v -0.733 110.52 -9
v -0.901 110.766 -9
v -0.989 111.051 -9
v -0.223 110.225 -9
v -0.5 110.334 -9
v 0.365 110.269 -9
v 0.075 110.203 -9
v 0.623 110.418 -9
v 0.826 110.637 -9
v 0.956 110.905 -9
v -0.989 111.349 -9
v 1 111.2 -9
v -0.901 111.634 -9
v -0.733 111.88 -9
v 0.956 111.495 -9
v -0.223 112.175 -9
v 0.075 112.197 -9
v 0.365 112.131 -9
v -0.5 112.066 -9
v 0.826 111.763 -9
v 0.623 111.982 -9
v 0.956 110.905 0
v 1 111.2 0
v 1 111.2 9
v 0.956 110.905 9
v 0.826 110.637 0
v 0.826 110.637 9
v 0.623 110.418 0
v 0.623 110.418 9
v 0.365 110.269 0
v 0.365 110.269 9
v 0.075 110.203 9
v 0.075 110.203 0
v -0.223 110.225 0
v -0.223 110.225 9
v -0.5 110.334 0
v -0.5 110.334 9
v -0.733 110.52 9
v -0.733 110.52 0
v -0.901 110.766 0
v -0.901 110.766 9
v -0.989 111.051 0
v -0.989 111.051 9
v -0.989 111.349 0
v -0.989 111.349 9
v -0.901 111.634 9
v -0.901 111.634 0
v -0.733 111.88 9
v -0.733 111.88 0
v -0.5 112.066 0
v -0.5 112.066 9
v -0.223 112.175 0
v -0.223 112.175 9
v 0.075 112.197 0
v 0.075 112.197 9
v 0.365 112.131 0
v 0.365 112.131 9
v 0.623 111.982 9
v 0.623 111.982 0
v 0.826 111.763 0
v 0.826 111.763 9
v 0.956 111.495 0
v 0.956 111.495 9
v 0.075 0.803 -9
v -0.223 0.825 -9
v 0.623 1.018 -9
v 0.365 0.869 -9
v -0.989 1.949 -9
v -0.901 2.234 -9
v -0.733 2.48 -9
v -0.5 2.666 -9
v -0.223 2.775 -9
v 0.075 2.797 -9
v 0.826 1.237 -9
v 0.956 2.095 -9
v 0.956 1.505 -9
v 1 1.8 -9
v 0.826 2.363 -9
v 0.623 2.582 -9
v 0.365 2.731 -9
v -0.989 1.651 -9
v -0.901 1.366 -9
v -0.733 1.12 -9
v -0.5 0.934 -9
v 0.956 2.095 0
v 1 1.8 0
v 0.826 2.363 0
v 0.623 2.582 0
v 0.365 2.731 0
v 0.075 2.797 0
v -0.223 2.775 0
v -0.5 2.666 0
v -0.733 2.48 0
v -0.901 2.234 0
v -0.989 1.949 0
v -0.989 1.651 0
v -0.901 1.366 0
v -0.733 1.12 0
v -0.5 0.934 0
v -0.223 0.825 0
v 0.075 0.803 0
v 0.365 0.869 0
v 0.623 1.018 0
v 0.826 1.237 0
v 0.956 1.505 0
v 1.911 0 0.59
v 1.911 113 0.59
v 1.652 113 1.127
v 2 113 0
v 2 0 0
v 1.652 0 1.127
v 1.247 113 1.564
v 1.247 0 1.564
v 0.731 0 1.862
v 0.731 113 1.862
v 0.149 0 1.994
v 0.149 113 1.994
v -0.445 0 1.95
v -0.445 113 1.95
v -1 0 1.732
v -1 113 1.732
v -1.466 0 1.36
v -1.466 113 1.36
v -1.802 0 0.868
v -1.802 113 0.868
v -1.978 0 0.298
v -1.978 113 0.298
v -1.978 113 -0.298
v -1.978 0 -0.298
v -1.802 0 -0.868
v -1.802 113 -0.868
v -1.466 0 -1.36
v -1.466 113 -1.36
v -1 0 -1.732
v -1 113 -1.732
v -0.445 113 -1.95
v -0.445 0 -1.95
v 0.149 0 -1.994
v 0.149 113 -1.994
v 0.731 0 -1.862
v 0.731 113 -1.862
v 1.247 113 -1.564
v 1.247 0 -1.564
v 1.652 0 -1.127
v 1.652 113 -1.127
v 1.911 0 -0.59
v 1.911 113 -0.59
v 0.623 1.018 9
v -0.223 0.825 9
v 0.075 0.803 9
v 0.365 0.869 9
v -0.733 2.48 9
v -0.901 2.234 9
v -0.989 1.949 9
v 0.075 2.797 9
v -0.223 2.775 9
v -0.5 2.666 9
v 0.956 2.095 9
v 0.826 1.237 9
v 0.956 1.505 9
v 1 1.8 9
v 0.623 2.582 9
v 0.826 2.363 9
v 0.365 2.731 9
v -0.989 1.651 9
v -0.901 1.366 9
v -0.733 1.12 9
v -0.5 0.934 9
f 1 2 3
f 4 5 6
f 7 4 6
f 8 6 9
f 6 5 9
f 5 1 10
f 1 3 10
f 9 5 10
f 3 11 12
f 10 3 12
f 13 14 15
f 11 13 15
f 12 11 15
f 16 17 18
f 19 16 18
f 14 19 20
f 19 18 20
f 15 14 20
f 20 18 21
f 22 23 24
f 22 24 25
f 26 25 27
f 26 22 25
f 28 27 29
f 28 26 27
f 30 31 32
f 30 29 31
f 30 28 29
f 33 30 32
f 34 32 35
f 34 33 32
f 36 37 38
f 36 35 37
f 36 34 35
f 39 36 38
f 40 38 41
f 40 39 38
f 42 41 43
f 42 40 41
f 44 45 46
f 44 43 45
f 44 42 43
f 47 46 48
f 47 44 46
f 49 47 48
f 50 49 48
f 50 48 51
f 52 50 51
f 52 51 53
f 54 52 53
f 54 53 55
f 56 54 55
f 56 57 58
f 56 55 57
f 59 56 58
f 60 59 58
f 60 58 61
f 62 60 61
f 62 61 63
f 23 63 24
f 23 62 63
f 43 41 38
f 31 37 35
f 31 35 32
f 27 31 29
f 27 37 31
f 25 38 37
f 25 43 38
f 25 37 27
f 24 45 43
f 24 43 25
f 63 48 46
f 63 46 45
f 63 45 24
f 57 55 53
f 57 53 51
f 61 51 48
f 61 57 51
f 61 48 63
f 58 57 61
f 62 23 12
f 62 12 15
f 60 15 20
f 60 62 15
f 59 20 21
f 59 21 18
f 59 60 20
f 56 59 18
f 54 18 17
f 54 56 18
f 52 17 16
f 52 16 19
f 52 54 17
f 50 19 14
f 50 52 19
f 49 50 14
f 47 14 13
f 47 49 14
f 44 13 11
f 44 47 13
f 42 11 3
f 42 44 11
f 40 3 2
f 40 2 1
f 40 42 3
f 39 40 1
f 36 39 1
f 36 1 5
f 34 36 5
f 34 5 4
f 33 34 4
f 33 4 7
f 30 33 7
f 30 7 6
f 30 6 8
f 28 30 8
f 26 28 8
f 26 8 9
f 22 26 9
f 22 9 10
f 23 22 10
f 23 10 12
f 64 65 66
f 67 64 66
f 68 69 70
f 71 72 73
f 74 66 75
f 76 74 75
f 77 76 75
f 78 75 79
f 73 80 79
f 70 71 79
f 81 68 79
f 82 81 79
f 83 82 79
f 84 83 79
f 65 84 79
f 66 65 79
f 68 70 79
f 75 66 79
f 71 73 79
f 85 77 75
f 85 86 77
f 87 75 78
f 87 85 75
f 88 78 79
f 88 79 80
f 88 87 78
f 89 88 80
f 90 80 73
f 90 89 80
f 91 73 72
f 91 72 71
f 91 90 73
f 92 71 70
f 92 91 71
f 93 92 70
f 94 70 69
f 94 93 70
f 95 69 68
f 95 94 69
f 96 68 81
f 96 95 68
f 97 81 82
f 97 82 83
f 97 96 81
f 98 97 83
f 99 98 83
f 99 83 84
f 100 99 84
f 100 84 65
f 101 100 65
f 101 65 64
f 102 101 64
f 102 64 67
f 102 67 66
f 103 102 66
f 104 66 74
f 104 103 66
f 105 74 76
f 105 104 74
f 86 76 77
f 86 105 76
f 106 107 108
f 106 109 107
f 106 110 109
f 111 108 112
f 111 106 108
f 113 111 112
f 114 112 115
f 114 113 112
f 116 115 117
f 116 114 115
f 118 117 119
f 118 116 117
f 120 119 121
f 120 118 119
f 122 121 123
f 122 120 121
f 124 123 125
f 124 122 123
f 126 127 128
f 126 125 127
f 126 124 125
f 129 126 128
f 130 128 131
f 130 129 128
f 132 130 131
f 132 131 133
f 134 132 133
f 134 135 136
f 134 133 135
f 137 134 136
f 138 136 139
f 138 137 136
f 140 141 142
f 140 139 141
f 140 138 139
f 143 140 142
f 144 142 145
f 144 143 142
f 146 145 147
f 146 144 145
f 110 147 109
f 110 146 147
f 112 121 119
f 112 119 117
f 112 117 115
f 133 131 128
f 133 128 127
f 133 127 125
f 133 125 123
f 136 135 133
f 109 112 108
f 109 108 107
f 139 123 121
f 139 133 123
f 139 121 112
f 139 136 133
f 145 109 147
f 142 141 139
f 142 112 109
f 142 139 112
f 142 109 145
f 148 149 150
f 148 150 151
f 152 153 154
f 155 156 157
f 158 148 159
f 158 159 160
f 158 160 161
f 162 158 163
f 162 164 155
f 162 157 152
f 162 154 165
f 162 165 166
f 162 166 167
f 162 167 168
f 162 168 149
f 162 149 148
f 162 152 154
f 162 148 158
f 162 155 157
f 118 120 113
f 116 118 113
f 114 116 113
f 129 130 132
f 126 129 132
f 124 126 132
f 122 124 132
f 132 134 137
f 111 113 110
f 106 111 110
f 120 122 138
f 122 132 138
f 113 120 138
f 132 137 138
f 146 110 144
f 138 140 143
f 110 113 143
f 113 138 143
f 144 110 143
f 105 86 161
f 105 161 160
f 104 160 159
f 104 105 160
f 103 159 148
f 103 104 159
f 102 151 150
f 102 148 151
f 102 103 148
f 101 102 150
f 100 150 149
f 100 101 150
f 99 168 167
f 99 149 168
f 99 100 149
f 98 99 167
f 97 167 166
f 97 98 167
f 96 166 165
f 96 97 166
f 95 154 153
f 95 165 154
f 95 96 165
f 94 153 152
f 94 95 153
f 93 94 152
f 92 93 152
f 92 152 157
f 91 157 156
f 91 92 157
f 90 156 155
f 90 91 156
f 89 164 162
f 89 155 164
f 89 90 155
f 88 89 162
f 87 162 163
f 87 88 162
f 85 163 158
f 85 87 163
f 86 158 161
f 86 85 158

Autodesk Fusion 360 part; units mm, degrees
sketch "Sketch1" plane through (0, 0, 0) normal (0, 1, 0) x (1, 0, 0)
  circle A0 centre (0, 0) radius 2
  dimension "d5" = 4
extrude "Extrude1" add sketch "Sketch1" along normal blind 113 makes body 1
sketch "Sketch2" plane through (0, 0, 0) normal (0, 0, 1) x (1, 0, 0)
  circle A0 centre (0, 1.8) radius 1
  circle A1 centre (0, 111.2) radius 1
  line L0 (2, 113) -> (-2, 113)
  dimension "d9" = 2
  dimension "d10" = 2
  dimension "d15" = 1.8
  dimension "d16" = 1.8
extrude "Extrude2" add sketch "Sketch2" along normal mid plane 18 separate body contours A1 makes body 2
extrude "Extrude3" add sketch "Sketch2" along normal mid plane 18 separate body contours A0 makes body 3
equation "length = 113 mm"
equation "radius = 2 mm"
equation "cup_little_bone_radius = 1 mm"
equation "cup_little_bone_length = 18 mm"
equation "d5 = radius * 2"
equation "edge_cup_little_bone_distance = 1.8 mm"
equation "d7 = length"
equation "d9 = cup_little_bone_radius * 2"
equation "d10 = cup_little_bone_radius * 2"
equation "d11 = cup_little_bone_length / 2"
equation "d13 = cup_little_bone_length / 2"
equation "d15 = edge_cup_little_bone_distance"
equation "d16 = edge_cup_little_bone_distance"
